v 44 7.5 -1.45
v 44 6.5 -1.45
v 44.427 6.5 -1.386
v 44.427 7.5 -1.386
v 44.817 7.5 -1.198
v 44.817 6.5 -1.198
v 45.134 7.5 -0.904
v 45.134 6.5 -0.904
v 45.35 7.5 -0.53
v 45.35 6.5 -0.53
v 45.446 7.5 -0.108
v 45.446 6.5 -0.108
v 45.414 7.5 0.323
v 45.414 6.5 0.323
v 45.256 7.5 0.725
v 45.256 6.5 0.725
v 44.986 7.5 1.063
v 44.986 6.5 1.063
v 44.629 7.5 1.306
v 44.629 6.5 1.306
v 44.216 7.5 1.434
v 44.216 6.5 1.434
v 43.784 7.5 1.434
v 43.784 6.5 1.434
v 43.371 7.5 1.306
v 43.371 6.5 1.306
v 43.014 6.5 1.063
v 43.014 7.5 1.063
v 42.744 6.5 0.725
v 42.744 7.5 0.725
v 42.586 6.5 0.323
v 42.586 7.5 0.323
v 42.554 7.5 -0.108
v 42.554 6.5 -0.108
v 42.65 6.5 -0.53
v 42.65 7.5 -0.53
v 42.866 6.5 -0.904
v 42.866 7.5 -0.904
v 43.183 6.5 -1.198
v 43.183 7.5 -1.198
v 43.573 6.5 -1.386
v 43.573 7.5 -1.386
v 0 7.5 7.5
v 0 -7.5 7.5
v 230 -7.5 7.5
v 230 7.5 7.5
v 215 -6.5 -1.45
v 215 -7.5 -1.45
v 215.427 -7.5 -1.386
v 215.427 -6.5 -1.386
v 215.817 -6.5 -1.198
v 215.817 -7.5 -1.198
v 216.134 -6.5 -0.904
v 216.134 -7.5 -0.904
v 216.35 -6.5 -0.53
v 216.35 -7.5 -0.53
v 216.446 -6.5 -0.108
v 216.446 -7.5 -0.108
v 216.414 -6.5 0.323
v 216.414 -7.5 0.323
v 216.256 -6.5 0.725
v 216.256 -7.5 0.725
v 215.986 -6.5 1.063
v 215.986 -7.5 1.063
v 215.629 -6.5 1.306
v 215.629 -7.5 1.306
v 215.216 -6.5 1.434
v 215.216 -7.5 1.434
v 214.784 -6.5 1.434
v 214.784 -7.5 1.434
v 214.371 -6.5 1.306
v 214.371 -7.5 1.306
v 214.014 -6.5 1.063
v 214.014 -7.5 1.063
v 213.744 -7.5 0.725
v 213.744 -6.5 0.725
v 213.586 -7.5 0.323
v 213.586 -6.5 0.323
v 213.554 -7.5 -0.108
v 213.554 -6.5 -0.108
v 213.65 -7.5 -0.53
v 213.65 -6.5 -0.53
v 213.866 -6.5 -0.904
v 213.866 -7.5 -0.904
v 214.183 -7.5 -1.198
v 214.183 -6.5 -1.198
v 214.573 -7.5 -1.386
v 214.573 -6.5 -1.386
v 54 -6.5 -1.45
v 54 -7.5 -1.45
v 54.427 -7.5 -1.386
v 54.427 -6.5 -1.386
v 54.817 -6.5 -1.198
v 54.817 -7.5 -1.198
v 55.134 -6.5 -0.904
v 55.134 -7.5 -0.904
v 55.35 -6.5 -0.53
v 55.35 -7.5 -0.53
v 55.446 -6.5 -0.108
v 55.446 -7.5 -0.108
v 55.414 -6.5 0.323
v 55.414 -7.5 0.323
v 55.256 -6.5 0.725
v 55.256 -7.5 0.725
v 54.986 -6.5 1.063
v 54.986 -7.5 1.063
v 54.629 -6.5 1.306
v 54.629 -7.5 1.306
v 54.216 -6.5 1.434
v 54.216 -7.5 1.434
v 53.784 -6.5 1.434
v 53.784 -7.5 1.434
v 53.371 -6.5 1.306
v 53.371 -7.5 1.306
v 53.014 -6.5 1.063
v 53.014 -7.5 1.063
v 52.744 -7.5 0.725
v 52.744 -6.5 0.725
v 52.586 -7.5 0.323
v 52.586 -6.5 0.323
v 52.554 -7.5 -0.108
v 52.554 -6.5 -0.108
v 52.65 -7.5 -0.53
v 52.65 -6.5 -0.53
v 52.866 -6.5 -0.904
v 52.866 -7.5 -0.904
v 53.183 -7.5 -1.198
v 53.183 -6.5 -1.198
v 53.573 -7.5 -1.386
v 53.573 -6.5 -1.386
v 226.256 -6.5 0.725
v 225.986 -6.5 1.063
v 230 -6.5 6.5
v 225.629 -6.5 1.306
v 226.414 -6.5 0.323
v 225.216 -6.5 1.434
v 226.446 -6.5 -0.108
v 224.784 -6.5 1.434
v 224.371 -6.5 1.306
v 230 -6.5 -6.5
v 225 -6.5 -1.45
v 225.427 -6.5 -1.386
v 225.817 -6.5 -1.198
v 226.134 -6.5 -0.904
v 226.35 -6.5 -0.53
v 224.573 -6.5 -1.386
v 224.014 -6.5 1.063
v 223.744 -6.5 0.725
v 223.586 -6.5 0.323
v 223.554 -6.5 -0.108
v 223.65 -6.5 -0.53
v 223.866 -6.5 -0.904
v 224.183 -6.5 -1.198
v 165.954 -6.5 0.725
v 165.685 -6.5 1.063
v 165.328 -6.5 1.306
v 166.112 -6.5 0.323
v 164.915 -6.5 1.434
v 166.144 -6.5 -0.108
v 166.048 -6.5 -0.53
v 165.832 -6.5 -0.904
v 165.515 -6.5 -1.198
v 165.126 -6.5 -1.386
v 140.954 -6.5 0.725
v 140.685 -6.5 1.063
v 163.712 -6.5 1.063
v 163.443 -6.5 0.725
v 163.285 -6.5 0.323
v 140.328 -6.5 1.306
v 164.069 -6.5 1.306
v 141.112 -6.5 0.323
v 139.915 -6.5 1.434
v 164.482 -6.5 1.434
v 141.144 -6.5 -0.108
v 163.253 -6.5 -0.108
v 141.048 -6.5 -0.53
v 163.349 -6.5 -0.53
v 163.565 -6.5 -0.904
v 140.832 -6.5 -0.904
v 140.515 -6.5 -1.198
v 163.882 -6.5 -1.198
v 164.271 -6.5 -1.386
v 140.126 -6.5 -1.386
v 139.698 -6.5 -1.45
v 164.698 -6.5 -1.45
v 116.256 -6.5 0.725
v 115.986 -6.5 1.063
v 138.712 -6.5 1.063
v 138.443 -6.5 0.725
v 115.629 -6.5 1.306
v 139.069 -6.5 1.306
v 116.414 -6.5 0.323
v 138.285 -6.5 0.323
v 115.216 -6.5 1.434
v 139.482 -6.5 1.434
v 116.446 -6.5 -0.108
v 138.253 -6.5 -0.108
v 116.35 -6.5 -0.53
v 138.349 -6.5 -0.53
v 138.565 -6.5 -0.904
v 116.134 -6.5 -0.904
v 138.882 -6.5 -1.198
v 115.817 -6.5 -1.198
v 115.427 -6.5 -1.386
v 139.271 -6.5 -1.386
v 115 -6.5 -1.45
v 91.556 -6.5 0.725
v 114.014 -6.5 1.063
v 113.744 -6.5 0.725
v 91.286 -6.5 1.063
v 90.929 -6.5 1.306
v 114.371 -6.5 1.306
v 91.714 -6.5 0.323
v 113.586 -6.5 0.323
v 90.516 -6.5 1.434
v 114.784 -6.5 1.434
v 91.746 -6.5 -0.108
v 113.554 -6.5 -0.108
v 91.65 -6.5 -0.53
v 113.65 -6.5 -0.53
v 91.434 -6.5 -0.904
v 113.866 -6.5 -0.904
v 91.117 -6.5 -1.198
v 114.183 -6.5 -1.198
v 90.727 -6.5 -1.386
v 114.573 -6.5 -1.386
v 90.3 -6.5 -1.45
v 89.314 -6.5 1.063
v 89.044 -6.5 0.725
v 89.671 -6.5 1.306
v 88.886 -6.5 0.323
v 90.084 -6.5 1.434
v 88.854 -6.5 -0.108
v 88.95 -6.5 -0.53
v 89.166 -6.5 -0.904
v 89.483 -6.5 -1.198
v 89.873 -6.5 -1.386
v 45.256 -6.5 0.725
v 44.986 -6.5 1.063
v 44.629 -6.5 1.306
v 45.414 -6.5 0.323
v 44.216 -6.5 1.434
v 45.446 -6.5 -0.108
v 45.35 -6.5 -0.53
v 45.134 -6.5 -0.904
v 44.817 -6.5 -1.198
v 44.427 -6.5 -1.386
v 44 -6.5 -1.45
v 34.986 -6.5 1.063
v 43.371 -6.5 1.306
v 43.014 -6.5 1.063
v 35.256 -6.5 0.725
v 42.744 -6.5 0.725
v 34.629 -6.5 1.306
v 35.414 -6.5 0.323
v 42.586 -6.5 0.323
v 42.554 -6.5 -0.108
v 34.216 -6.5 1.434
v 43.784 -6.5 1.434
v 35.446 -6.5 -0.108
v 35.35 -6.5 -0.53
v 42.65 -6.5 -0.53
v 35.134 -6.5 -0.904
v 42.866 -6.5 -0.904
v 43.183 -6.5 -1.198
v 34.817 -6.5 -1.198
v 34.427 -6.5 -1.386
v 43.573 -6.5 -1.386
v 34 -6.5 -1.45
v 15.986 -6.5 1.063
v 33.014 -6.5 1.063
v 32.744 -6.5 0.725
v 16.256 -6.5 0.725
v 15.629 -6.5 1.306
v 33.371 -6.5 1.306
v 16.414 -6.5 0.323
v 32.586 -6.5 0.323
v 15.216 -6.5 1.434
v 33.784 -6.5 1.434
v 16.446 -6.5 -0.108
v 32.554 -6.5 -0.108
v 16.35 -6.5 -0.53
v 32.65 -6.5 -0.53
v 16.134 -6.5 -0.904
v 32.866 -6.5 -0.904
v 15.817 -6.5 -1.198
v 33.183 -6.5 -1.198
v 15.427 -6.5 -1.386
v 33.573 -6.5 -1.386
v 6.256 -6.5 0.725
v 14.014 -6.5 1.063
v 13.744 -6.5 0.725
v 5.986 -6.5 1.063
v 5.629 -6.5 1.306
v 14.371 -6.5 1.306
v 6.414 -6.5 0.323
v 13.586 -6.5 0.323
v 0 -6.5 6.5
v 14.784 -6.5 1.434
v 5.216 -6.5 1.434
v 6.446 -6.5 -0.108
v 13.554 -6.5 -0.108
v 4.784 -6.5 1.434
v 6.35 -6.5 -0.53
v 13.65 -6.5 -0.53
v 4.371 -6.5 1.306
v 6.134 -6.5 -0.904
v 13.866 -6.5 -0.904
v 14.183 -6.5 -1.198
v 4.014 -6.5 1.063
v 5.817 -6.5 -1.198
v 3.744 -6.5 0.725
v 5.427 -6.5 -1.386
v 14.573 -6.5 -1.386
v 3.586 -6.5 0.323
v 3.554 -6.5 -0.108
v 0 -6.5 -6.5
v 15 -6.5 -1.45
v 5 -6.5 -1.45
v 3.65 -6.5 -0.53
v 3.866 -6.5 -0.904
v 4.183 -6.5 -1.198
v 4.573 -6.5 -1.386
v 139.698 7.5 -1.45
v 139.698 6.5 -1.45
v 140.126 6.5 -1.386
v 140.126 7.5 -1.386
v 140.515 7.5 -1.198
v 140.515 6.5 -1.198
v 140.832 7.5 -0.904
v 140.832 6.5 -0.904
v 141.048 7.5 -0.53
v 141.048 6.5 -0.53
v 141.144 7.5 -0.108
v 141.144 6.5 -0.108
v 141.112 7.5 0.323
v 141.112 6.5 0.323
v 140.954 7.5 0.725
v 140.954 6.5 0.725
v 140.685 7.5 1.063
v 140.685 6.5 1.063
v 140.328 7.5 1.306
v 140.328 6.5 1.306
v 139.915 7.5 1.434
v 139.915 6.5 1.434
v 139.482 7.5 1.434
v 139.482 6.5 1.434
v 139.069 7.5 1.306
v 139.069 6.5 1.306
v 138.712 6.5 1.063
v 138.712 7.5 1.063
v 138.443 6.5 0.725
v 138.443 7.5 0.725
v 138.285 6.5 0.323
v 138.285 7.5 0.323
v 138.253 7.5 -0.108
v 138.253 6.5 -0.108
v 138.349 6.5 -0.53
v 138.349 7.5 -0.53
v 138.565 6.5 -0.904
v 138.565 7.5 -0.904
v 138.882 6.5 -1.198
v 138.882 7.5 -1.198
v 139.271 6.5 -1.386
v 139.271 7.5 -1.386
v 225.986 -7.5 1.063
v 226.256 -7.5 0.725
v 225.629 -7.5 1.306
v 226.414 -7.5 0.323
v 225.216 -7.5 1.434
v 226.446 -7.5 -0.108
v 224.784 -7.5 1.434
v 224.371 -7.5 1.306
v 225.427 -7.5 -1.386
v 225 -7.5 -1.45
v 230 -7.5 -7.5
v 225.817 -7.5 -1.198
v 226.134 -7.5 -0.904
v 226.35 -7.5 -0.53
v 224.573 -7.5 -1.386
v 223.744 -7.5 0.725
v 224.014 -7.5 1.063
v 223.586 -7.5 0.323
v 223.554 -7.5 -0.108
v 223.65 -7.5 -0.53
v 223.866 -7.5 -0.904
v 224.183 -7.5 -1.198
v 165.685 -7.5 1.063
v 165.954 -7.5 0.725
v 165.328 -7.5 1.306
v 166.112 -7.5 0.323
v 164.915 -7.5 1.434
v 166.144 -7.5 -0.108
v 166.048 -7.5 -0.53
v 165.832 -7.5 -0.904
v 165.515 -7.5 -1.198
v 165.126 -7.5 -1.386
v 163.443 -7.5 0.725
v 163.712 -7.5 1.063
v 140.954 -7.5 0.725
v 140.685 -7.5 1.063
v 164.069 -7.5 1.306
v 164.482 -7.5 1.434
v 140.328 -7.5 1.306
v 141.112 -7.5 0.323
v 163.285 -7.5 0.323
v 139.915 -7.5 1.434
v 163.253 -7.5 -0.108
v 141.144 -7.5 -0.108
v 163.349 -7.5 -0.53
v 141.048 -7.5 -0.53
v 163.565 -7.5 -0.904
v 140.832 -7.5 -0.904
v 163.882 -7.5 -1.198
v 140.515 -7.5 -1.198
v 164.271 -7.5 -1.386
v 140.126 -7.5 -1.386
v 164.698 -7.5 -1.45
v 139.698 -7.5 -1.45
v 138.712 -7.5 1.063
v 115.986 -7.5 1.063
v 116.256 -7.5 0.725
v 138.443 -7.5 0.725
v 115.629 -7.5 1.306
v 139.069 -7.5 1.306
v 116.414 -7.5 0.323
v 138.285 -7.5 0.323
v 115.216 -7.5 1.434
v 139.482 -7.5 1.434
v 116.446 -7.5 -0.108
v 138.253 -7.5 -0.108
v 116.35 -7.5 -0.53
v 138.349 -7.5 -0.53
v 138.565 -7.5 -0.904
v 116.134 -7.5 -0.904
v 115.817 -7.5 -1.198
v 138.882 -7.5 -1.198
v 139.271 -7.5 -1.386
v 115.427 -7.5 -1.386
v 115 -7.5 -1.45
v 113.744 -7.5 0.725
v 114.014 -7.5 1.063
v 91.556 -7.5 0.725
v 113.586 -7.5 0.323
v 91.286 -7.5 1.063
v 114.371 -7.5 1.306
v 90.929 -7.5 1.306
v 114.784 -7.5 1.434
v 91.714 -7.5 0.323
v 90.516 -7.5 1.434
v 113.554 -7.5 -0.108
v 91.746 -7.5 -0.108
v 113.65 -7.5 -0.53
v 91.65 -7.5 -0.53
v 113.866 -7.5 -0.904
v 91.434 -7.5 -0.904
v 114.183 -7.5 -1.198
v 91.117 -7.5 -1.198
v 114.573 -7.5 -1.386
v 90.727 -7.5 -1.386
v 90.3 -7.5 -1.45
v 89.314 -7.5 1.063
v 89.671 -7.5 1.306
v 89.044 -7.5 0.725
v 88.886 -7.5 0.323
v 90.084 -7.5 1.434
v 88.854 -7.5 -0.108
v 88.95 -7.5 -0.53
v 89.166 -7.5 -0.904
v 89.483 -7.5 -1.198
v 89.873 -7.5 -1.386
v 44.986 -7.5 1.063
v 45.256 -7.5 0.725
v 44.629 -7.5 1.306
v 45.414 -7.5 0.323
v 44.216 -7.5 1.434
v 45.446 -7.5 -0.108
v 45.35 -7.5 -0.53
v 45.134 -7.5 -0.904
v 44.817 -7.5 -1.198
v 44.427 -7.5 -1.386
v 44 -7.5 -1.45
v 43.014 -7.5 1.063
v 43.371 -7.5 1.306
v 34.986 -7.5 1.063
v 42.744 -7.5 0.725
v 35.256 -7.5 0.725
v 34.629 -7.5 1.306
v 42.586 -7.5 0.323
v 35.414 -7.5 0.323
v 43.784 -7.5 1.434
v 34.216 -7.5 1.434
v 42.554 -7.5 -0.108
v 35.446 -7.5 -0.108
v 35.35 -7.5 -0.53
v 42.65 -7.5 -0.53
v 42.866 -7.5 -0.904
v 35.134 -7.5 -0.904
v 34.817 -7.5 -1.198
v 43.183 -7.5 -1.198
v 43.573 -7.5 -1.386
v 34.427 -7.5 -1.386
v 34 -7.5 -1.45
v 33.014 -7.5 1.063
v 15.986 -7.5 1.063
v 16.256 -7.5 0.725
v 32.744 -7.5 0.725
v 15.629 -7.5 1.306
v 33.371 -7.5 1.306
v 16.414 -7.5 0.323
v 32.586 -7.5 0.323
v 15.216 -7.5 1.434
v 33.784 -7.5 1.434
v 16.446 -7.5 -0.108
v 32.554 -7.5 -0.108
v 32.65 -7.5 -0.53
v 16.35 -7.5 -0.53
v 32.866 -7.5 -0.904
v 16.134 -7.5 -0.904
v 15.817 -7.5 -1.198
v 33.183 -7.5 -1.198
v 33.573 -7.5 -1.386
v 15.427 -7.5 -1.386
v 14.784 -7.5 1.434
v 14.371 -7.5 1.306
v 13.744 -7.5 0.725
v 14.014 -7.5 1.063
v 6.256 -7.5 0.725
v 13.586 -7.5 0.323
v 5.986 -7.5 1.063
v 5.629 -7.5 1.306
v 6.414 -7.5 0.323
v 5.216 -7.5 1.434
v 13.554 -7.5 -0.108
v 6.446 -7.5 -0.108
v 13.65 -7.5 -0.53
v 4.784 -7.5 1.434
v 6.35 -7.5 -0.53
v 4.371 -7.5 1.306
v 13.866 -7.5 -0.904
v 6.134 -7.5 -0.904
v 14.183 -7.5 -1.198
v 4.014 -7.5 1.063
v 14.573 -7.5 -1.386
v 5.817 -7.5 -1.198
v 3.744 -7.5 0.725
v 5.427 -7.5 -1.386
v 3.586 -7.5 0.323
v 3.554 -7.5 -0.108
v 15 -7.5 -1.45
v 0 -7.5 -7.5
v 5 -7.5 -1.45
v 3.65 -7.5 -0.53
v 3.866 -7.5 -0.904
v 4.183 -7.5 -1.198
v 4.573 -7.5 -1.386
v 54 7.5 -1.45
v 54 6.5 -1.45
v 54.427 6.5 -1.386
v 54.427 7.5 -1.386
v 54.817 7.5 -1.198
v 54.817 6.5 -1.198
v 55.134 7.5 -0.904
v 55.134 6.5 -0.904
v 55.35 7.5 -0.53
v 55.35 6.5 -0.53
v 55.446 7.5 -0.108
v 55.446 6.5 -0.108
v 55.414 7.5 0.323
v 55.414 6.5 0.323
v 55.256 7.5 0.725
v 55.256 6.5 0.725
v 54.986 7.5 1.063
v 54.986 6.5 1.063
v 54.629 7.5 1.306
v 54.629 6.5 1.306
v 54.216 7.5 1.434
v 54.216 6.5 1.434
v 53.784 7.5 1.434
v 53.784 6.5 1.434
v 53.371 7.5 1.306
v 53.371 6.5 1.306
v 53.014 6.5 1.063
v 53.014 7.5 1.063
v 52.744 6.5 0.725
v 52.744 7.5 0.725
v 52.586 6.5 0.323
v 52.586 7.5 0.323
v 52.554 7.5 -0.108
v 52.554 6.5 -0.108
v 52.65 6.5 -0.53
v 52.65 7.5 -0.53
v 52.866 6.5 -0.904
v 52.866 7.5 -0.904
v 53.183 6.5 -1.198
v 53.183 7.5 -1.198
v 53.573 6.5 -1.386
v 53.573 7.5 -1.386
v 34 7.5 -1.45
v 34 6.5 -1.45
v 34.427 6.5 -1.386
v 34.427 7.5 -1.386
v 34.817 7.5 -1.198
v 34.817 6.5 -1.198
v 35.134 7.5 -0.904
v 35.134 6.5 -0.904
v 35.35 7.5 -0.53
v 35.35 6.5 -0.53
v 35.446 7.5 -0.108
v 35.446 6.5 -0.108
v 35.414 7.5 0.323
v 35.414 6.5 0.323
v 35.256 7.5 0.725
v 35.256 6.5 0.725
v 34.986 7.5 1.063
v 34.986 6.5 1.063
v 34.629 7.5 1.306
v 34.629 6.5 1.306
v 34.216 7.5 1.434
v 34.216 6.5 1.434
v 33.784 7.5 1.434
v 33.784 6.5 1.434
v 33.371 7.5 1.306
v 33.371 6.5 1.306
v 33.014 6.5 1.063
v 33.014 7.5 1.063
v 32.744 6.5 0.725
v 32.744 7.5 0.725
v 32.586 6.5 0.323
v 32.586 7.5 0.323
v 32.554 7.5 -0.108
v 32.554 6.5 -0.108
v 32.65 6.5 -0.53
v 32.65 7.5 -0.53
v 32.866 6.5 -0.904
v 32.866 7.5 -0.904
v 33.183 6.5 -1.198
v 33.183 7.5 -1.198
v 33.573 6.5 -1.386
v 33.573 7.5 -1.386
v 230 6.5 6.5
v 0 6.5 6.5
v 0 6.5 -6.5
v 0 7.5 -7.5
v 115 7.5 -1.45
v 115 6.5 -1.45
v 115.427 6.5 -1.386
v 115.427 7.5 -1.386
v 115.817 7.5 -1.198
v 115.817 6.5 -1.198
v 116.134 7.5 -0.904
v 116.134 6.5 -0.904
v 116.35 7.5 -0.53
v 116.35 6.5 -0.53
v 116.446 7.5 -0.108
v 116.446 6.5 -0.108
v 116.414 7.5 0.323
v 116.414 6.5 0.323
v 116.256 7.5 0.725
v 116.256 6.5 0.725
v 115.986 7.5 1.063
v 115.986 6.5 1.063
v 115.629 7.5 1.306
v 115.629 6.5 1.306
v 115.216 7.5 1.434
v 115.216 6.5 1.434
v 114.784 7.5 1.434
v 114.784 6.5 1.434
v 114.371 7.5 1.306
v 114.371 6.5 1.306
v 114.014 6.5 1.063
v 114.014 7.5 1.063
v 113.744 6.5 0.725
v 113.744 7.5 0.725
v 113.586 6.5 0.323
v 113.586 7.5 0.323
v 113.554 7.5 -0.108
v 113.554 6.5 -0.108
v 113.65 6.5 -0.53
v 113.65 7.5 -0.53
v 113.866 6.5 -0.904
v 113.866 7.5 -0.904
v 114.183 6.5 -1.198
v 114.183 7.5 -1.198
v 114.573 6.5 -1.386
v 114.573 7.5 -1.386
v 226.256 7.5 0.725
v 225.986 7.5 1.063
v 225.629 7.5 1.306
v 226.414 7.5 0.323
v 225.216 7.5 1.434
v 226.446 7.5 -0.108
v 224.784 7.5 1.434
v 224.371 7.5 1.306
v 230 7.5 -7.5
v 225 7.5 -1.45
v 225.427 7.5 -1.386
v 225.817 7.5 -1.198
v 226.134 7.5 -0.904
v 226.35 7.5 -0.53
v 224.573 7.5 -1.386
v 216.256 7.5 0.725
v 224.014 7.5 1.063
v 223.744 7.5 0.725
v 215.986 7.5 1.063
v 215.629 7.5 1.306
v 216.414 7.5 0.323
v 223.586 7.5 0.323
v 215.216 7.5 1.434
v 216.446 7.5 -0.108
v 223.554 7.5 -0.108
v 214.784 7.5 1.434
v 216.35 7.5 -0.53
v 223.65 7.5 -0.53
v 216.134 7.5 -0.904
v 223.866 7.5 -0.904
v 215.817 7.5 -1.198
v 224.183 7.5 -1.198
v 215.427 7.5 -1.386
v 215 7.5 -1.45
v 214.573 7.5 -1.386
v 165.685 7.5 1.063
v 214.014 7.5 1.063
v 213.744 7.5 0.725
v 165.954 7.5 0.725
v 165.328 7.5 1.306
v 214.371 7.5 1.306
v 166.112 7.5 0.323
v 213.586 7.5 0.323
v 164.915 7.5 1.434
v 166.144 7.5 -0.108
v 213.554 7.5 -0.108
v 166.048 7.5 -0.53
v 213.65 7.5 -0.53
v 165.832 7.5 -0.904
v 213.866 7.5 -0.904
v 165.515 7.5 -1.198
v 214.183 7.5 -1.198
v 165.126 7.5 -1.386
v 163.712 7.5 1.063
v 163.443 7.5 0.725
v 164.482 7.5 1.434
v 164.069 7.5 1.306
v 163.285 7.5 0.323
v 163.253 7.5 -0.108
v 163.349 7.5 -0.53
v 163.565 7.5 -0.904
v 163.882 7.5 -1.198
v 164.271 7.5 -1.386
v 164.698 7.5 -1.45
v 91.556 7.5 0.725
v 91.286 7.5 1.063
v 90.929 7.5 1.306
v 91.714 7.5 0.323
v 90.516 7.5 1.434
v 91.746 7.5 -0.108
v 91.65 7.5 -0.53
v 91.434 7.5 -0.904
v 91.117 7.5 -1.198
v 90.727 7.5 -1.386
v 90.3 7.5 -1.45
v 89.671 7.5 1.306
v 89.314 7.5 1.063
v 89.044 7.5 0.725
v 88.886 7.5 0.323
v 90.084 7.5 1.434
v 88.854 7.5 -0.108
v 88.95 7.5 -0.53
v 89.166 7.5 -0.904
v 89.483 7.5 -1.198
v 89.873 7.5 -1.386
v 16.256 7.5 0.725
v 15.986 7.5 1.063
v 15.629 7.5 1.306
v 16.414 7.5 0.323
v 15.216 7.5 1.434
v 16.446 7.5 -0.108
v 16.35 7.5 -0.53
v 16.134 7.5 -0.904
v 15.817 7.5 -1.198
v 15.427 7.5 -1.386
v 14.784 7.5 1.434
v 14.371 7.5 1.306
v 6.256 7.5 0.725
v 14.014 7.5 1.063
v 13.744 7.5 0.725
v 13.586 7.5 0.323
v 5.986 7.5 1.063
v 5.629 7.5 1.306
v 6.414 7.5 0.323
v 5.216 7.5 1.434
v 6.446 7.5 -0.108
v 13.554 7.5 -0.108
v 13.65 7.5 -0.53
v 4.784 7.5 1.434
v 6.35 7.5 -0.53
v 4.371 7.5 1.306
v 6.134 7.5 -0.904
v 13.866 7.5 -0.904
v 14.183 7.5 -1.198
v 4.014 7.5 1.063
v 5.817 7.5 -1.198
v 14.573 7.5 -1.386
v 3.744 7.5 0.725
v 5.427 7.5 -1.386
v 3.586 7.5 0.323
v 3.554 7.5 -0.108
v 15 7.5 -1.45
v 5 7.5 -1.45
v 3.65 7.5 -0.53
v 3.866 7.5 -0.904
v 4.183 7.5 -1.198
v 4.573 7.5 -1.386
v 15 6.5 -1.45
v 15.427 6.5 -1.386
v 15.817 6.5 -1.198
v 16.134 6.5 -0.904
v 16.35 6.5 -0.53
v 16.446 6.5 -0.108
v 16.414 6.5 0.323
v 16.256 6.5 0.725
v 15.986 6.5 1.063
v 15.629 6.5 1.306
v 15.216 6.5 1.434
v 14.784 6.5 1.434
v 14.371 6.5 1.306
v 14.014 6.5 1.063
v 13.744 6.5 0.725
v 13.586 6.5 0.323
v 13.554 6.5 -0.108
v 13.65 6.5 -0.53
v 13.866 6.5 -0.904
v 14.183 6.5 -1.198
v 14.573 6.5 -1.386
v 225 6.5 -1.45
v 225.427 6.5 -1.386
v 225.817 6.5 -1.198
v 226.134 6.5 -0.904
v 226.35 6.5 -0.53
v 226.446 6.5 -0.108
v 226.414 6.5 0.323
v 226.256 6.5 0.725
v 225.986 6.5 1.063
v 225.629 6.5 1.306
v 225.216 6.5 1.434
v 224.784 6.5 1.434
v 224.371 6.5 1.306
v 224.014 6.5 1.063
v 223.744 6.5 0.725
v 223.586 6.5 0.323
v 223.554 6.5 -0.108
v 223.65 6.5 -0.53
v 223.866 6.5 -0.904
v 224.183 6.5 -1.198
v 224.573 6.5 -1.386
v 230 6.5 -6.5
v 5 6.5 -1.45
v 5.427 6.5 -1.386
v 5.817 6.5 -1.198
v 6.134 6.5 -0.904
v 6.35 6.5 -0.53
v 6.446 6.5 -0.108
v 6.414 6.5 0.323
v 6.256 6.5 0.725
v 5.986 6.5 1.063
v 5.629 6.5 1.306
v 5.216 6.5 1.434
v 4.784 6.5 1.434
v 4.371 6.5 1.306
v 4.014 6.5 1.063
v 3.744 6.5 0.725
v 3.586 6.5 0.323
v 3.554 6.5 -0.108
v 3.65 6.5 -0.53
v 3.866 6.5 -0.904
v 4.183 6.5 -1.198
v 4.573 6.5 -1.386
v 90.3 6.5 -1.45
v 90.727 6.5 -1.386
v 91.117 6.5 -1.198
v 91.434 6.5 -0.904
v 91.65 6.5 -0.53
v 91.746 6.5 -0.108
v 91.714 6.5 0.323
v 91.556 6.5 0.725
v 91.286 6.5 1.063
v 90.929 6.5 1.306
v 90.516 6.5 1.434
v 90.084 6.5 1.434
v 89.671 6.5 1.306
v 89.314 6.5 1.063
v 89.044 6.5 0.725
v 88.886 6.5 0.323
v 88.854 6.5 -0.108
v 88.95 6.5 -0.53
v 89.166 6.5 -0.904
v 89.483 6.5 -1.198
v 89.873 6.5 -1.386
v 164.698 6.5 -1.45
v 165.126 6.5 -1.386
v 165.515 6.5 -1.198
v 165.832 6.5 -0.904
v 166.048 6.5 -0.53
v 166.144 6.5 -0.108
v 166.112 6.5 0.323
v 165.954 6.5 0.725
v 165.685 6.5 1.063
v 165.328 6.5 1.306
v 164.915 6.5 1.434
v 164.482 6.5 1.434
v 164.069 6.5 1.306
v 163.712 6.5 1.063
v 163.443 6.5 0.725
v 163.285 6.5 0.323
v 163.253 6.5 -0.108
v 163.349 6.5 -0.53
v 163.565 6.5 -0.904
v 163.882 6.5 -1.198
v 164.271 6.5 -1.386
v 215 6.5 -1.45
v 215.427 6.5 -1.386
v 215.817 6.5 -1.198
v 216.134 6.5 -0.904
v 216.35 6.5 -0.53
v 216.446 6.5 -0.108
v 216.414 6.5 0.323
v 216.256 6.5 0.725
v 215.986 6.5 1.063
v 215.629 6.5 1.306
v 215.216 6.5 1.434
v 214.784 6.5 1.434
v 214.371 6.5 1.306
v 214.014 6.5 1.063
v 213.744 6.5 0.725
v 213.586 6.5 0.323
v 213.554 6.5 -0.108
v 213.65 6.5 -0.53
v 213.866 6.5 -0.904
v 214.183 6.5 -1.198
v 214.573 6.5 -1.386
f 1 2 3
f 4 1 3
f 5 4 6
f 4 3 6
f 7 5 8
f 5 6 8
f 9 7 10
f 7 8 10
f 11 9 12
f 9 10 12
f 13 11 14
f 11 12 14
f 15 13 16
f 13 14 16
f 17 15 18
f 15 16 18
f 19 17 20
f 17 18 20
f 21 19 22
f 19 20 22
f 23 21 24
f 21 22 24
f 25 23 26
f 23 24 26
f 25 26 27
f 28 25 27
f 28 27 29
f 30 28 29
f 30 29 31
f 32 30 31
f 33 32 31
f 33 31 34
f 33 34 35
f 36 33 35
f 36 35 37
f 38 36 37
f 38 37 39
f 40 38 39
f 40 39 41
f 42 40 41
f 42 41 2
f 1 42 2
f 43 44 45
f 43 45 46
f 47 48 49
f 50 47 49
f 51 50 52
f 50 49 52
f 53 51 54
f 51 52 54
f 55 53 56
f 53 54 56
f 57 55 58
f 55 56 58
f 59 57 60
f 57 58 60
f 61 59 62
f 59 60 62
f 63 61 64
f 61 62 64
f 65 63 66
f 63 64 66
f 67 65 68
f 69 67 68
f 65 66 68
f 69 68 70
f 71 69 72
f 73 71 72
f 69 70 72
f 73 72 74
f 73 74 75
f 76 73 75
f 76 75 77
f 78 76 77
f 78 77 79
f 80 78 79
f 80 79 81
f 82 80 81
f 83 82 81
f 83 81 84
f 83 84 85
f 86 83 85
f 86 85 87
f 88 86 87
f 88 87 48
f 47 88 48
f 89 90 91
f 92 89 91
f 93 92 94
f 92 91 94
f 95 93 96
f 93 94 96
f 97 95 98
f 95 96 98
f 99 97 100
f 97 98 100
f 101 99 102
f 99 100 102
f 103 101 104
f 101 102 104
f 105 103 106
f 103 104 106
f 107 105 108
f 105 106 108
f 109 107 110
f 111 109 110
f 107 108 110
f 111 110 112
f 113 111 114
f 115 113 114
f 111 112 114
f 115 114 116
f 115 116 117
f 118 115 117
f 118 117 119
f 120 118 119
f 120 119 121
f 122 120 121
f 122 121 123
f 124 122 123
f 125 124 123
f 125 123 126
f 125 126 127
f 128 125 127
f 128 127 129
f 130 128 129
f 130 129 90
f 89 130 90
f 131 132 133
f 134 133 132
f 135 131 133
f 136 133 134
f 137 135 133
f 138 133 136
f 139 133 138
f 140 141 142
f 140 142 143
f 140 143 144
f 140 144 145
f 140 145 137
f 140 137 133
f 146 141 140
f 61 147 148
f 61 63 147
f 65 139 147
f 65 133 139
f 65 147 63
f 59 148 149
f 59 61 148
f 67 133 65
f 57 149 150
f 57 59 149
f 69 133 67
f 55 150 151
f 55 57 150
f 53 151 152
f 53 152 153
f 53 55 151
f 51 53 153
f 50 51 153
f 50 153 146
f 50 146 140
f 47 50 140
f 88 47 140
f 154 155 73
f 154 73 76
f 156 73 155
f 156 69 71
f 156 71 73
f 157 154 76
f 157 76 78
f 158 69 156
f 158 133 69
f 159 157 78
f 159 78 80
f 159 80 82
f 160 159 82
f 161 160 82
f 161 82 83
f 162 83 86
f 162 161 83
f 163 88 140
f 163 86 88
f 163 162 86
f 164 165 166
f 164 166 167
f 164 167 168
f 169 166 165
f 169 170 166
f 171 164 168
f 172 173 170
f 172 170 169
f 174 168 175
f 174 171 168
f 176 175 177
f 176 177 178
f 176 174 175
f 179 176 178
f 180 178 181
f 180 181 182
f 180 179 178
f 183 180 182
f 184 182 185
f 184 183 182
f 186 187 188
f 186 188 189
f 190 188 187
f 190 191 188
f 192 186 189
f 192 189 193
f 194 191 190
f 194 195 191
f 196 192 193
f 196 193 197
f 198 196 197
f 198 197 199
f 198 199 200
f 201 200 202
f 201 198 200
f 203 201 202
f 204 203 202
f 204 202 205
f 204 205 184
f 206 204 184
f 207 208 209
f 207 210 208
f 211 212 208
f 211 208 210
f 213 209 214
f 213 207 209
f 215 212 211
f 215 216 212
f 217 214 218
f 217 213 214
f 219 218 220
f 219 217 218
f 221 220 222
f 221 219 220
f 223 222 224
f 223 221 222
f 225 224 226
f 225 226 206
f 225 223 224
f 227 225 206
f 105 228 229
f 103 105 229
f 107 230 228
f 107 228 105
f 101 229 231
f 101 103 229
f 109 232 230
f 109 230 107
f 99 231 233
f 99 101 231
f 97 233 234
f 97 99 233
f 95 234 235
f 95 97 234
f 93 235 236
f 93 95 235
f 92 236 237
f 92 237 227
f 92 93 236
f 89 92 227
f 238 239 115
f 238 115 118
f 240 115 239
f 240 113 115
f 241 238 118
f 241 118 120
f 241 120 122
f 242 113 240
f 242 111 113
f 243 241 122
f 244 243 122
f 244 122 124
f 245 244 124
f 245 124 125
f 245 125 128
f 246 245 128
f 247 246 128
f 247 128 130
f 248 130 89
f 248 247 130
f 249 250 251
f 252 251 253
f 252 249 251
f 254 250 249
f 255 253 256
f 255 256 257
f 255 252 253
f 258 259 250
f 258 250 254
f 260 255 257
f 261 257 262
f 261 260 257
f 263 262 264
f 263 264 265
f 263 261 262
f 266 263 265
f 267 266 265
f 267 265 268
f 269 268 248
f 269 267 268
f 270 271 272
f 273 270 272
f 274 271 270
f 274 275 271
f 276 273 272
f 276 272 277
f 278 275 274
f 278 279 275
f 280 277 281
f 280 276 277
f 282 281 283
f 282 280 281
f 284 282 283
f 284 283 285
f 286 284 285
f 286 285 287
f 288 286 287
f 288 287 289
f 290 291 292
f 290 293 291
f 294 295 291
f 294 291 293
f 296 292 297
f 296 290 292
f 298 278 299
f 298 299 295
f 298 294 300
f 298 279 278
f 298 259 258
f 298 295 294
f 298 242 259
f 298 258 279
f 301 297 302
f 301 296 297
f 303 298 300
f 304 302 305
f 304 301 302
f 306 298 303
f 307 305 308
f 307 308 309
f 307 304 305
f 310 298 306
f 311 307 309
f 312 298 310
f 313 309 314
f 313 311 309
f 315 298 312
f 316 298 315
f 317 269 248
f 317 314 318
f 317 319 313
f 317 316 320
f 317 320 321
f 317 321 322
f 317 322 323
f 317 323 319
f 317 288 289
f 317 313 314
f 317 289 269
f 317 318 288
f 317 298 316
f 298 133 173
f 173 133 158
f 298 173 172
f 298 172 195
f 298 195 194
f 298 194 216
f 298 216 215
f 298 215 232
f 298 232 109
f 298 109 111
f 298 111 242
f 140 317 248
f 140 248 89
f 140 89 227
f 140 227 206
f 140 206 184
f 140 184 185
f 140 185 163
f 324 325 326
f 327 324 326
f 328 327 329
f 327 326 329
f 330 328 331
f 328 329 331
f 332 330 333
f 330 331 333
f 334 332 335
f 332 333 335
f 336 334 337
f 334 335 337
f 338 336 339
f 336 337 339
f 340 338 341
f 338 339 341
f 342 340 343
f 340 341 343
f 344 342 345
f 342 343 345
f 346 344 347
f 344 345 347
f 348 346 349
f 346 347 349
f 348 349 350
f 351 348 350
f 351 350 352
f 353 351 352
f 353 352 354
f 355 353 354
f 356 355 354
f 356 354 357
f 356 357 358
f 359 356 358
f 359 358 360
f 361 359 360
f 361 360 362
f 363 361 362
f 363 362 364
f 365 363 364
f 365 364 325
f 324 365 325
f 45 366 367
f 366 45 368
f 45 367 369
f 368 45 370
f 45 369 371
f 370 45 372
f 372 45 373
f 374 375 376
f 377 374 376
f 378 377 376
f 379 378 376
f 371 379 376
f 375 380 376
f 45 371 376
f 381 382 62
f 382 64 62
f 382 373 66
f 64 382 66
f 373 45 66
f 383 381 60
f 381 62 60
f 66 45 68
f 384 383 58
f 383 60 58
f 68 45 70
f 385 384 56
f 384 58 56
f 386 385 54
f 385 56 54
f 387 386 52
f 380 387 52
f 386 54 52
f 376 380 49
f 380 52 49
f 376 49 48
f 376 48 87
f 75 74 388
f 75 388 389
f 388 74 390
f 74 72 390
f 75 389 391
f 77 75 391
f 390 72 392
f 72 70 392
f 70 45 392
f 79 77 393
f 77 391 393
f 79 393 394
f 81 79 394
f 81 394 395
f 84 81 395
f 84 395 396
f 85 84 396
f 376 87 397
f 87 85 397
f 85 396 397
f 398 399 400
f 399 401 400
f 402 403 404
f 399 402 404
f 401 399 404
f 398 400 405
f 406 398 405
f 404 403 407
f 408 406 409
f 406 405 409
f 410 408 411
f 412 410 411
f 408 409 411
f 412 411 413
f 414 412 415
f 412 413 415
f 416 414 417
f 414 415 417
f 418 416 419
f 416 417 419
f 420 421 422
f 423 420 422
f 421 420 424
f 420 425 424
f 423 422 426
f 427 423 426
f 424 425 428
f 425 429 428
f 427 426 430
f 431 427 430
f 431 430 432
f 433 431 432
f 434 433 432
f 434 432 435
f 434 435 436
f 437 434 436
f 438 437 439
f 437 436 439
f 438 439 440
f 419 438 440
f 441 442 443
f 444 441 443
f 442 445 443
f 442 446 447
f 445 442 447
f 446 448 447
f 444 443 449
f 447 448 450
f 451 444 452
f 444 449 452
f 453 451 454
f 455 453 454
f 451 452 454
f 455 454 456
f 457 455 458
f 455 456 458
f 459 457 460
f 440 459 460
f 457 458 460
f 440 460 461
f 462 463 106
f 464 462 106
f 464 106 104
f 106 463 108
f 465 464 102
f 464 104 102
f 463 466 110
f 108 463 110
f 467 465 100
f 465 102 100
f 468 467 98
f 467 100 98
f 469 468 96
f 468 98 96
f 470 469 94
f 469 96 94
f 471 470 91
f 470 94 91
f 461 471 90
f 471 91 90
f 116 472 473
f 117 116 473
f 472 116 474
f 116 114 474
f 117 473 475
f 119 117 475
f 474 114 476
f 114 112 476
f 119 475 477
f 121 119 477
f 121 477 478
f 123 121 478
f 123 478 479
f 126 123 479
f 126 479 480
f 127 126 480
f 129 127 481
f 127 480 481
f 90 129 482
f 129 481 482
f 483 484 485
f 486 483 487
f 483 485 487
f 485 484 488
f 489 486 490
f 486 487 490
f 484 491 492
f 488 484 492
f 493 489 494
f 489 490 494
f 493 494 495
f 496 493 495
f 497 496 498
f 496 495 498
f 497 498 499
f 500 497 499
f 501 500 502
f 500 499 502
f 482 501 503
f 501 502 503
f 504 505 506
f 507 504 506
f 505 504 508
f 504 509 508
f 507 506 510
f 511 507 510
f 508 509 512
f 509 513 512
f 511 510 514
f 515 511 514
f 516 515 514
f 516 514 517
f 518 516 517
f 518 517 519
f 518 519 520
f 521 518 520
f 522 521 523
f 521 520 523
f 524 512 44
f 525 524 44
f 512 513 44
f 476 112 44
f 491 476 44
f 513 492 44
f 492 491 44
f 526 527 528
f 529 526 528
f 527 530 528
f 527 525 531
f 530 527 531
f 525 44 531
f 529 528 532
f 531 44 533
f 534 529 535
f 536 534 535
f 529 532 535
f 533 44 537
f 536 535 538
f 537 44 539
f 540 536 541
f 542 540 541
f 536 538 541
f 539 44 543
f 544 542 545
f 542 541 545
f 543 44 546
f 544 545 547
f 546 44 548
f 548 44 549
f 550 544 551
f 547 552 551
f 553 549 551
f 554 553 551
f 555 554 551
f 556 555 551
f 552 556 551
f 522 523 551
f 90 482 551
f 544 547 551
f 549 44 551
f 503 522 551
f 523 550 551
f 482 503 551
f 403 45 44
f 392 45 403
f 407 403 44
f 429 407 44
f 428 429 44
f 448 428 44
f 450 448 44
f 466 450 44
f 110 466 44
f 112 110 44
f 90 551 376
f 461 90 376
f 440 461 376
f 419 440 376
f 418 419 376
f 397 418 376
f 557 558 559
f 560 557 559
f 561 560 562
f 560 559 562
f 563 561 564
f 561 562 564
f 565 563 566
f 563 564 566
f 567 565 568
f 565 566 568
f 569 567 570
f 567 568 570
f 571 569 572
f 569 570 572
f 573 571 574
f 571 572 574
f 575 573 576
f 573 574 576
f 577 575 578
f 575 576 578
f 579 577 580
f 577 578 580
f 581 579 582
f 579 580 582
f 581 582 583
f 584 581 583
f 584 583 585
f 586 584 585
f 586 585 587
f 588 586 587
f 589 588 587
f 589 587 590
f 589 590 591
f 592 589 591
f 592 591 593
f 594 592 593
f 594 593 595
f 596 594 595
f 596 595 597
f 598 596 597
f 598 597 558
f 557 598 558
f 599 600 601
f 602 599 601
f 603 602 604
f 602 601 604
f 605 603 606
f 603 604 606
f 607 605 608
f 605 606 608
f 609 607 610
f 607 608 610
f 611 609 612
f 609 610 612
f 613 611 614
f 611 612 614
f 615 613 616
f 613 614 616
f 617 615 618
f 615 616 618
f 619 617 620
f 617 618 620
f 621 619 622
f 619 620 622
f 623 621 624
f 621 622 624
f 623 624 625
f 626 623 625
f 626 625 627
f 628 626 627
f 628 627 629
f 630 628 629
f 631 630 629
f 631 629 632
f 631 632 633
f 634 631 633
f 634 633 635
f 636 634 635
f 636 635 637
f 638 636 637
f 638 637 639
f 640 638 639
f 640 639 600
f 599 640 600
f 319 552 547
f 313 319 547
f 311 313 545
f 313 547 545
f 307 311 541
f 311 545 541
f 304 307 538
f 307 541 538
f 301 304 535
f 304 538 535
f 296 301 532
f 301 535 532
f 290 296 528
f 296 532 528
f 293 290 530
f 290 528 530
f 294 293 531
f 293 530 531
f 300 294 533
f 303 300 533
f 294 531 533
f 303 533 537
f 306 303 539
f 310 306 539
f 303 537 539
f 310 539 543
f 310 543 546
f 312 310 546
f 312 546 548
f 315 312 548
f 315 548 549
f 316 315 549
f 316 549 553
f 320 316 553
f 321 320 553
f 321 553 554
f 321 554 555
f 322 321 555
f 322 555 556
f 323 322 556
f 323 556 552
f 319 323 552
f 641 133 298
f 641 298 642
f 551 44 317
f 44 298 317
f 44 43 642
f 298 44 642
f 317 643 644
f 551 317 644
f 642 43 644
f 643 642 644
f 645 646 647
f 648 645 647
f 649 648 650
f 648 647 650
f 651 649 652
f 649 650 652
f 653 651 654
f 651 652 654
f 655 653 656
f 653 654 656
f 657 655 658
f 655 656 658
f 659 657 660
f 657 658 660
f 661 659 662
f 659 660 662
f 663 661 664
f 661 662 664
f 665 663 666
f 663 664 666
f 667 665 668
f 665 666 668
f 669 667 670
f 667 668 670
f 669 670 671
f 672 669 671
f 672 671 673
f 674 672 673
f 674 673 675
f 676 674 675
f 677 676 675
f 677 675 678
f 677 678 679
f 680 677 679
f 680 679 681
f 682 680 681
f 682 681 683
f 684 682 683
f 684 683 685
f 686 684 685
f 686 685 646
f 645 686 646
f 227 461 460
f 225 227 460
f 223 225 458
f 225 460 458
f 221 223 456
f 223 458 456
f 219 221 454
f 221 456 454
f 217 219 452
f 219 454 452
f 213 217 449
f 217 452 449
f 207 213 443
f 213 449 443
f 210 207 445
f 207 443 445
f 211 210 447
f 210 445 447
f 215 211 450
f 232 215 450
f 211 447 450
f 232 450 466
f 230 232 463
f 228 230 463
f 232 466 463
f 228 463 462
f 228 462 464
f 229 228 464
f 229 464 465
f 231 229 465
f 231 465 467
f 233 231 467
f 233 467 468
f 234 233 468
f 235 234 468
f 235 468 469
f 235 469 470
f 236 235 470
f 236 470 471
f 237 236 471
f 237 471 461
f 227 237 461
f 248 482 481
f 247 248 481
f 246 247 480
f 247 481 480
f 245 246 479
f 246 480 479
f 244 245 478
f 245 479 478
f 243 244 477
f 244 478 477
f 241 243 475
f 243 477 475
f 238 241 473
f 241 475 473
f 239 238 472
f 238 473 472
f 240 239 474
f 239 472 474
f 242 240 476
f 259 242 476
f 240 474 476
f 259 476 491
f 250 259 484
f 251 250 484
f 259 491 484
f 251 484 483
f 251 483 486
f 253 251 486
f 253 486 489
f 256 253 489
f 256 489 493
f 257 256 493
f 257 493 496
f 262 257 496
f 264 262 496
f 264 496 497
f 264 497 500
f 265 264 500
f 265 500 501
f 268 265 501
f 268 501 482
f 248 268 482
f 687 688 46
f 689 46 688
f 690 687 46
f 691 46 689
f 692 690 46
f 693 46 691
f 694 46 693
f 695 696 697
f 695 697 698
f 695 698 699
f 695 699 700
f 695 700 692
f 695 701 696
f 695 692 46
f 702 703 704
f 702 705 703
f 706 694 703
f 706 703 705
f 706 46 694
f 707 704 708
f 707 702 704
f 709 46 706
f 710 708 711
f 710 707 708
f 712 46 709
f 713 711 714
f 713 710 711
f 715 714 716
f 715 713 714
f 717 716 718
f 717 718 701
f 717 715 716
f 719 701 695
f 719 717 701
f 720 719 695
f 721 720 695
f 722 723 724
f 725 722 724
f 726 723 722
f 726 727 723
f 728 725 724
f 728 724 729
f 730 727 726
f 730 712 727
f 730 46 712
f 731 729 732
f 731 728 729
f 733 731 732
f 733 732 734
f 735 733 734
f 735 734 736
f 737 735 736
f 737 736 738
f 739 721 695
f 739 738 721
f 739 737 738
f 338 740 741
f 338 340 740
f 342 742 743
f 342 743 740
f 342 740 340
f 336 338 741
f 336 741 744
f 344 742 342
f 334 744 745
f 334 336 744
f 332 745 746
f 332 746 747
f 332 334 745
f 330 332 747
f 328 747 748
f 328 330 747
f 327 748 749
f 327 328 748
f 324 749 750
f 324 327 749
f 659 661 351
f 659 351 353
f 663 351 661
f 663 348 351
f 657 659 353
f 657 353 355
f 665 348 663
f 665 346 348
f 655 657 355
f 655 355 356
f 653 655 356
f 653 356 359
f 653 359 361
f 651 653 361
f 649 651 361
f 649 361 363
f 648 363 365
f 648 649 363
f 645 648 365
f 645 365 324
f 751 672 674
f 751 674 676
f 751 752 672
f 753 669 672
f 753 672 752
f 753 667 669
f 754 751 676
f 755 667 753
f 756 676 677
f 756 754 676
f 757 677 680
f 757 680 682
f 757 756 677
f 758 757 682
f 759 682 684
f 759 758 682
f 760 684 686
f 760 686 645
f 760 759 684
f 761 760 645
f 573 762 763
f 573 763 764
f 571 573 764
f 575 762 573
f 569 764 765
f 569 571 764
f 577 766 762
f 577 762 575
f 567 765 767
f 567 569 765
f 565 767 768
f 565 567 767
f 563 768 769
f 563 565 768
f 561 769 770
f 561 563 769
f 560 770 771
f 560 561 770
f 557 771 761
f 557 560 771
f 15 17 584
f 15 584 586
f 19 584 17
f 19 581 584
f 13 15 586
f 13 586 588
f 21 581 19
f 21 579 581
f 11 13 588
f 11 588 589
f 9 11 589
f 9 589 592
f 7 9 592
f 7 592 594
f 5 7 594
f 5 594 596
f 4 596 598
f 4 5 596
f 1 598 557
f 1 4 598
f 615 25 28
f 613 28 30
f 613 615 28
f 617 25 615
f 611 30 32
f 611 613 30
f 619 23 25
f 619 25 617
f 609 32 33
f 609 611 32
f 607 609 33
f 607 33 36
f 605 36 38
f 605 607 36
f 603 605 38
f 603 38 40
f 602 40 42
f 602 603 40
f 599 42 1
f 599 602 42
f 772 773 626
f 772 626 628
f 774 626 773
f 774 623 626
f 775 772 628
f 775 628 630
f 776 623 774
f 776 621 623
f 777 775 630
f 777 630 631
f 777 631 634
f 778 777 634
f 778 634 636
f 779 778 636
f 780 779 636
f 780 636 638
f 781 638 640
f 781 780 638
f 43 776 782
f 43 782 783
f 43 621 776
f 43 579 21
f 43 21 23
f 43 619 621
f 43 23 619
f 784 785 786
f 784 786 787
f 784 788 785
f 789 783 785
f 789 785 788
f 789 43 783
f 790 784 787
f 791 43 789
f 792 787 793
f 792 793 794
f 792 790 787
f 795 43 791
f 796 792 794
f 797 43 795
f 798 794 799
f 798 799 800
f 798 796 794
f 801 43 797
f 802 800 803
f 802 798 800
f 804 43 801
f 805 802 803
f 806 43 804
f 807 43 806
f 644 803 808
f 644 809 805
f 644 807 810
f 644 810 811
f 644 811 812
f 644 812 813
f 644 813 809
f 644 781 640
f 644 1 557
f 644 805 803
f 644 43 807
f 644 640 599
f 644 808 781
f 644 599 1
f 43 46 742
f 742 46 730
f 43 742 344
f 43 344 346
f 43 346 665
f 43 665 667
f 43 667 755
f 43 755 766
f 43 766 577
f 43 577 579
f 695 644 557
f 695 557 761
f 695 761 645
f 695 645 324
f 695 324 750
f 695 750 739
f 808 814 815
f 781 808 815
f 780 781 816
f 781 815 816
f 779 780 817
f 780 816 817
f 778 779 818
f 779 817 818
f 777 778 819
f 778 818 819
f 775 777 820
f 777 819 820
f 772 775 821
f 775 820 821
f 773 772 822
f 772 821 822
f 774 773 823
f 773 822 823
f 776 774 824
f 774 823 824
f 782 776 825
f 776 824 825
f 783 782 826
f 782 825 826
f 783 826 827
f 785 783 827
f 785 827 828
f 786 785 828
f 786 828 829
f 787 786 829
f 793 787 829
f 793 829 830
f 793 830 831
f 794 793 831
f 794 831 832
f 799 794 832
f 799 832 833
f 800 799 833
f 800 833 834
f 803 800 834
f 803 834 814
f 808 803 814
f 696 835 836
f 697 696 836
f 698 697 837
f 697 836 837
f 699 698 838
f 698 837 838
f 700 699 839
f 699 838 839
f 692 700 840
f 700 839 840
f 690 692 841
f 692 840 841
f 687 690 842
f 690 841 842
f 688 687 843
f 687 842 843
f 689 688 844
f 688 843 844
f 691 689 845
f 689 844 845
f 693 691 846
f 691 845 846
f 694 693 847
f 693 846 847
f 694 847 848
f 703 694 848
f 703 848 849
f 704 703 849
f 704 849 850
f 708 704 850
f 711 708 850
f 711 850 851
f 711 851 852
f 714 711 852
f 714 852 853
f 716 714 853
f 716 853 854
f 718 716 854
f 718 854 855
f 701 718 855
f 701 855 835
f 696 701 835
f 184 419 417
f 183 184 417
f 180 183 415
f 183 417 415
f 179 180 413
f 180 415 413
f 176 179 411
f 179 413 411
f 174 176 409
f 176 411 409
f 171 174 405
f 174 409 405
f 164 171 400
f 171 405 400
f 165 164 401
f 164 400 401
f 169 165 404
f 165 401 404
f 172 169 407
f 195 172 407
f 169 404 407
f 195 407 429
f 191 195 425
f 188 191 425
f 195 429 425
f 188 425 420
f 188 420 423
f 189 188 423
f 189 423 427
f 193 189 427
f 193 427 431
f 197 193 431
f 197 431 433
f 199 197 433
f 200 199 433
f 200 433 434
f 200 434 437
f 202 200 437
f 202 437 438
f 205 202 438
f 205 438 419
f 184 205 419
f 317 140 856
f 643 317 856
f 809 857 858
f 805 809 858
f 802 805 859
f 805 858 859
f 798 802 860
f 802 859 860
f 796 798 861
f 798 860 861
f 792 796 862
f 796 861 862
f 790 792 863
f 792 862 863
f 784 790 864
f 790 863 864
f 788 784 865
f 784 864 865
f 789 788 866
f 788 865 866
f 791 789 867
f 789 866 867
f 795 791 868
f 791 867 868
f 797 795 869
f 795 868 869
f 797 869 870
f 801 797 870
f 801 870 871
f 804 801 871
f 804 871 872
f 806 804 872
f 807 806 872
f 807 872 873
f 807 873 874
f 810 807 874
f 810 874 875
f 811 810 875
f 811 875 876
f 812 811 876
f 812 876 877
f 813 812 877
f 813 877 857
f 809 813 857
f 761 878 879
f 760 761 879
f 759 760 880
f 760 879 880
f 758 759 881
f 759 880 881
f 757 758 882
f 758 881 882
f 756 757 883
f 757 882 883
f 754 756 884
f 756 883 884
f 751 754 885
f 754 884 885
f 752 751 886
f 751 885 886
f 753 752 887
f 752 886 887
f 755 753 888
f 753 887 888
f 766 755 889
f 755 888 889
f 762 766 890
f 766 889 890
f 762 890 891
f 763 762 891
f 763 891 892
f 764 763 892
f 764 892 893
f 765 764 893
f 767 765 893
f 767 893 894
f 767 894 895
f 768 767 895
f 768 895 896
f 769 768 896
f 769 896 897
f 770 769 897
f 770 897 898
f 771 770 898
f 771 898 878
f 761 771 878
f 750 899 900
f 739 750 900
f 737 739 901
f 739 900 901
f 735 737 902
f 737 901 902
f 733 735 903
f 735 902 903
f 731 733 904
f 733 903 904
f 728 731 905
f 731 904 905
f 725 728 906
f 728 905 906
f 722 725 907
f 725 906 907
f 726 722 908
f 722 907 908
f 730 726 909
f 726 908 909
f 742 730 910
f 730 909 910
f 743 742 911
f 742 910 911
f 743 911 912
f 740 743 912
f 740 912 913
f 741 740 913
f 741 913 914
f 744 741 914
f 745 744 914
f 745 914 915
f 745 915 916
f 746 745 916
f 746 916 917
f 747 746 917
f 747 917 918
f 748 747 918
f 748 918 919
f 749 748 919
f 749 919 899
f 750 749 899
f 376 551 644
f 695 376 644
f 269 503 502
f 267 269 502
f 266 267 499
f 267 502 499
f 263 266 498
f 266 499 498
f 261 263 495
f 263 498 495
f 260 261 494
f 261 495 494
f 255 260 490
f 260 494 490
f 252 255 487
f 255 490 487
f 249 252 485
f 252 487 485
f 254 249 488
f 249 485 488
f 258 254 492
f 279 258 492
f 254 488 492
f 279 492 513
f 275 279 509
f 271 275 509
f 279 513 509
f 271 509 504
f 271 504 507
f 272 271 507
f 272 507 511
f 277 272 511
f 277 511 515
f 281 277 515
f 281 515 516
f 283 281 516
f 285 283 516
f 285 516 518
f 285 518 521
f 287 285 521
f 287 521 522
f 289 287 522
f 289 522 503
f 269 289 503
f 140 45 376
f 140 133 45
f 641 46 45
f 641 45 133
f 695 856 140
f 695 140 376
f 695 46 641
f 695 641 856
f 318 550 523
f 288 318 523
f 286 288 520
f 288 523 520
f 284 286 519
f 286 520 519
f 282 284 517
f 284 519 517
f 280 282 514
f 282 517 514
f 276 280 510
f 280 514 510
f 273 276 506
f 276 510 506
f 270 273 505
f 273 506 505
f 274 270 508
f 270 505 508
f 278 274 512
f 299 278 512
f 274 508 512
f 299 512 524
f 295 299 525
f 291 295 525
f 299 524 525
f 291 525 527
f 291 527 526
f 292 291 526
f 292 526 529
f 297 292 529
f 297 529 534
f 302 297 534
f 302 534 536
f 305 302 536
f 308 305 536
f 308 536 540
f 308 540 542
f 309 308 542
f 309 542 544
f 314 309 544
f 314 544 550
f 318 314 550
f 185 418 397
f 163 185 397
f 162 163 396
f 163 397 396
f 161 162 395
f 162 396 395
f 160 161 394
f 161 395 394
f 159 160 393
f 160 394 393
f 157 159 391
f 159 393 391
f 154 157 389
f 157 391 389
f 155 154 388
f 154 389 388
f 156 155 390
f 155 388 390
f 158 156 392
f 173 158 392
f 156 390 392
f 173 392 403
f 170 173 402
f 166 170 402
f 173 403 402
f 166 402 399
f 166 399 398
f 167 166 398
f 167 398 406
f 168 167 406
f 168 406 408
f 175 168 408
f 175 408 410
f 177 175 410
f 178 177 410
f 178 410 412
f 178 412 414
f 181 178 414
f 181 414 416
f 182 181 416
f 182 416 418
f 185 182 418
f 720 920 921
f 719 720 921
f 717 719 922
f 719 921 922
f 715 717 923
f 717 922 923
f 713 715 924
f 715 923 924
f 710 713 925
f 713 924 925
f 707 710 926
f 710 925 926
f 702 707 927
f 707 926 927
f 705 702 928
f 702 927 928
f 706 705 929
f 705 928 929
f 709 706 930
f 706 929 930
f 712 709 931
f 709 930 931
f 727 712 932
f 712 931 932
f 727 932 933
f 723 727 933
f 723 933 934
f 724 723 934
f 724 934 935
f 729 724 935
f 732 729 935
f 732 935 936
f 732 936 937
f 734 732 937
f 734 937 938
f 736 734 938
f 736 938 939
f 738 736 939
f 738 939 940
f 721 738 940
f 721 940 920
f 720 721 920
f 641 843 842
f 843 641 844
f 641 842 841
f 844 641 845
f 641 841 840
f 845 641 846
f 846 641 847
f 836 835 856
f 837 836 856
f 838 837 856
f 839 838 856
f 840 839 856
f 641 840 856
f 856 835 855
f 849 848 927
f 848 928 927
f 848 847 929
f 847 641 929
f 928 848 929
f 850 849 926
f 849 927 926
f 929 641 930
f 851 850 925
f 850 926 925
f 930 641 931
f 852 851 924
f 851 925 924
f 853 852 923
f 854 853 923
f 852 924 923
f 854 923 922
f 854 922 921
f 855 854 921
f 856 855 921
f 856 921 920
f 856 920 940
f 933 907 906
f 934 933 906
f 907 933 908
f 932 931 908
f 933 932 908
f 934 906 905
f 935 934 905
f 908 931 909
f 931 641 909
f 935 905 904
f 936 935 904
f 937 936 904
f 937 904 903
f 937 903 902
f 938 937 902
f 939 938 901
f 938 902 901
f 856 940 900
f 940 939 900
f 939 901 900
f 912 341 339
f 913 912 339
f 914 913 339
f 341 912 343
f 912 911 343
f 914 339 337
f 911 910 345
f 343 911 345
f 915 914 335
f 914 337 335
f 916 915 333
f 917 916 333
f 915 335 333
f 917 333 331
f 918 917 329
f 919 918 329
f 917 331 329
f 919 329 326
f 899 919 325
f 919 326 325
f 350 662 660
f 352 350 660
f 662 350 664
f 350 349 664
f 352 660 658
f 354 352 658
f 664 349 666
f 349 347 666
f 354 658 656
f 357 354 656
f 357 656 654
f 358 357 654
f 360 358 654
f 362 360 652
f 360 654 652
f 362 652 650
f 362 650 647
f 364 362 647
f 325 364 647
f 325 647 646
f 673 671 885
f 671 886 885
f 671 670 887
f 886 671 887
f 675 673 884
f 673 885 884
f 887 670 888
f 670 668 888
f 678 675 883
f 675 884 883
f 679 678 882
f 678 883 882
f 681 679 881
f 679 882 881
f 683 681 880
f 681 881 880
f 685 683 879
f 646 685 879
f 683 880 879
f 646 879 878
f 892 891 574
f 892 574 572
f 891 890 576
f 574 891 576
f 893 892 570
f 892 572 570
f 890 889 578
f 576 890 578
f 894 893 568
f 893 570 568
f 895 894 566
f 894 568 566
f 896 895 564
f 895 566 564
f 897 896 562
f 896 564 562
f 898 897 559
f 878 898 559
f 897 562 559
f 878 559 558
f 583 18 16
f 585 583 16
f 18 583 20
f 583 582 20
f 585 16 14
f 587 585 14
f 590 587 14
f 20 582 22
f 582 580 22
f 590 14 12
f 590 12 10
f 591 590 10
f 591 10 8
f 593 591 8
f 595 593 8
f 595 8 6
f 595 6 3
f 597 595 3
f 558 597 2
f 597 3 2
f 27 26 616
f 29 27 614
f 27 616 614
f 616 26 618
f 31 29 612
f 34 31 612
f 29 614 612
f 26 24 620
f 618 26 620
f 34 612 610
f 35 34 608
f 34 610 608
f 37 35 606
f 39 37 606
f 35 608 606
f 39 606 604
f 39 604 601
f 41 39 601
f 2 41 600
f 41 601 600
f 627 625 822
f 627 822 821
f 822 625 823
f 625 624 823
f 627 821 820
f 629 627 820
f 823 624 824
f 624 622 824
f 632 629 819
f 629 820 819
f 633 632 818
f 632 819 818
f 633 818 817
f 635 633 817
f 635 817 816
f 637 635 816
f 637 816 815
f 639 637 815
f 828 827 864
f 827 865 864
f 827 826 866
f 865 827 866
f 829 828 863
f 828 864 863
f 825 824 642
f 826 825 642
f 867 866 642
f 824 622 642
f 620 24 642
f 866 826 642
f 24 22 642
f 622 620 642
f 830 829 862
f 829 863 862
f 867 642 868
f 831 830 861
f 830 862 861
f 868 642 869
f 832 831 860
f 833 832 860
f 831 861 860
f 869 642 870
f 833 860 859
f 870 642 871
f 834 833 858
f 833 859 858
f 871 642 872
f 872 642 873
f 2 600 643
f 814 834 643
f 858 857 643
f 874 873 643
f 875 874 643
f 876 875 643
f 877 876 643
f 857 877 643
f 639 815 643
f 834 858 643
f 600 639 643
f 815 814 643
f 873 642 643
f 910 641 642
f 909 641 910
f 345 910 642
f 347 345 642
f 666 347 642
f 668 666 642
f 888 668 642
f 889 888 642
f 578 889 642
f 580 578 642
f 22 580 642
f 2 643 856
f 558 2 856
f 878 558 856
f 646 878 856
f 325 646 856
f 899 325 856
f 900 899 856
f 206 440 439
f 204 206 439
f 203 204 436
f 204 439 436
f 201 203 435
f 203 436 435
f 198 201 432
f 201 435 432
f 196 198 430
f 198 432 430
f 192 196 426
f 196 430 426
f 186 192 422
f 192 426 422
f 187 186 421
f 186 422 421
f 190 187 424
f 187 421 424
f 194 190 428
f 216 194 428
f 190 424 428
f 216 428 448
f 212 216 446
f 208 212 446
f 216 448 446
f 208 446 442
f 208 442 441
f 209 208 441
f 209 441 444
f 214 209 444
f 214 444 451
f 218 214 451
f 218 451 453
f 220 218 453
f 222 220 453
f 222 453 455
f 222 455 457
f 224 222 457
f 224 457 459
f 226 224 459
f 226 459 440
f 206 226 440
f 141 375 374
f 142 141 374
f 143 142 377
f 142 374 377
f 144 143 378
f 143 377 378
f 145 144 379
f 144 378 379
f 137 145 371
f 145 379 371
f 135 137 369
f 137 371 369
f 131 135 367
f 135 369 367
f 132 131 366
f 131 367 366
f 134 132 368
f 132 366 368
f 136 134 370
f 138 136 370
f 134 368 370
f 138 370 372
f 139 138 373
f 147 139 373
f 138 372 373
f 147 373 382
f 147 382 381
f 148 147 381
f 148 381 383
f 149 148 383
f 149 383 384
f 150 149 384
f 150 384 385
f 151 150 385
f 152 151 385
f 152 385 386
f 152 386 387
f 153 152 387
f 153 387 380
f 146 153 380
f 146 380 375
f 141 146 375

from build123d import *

# Parameters (mm, degrees)
SKETCH_1_W          = 15
SKETCH_1_H          = 15
SKETCH_1_W_2        = 13
SKETCH_1_H_2        = 13
EXTRUDE_1_DEPTH     = 230
SKETCH_2_R          = 1.45
CUT_EXTRUDE_1_DEPTH = 231.610602532


with BuildPart() as part:
    # 草图1 → 凸台-拉伸1 (new body)
    with BuildSketch(Plane(origin=(0, 0, 0), x_dir=(0, 0, -1), z_dir=(1, 0, 0))):
        Rectangle(SKETCH_1_W, SKETCH_1_H)
        Rectangle(SKETCH_1_W_2, SKETCH_1_H_2, mode=Mode.SUBTRACT)
    extrude(amount=EXTRUDE_1_DEPTH)

    # 草图2 → 切除-拉伸1 (cut, through all)
    with BuildSketch(Plane.XZ.offset(7.5)):
        with Locations(Location((215, 0, 0), (0, 0, 270))):
            Circle(SKETCH_2_R)
        with Locations(Location((225, 0, 0), (0, 0, 270))):
            Circle(SKETCH_2_R)
        with Locations(Location((164.69848481, 0, 0), (0, 0, 270))):
            Circle(SKETCH_2_R)
        with Locations(Location((139.69848481, 0, 0), (0, 0, 270))):
            Circle(SKETCH_2_R)
        with Locations(Location((5, 0, 0), (0, 0, 270))):
            Circle(SKETCH_2_R)
        with Locations(Location((15, 0, 0), (0, 0, 270))):
            Circle(SKETCH_2_R)
        with Locations(Location((115, 0, 0), (0, 0, 270))):
            Circle(SKETCH_2_R)
        with Locations(Location((90.3, 0, 0), (0, 0, 270))):
            Circle(SKETCH_2_R)
        with Locations(Location((34, 0, 0), (0, 0, 270))):
            Circle(SKETCH_2_R)
        with Locations(Location((44, 0, 0), (0, 0, 270))):
            Circle(SKETCH_2_R)
        with Locations(Location((54, 0, 0), (0, 0, 270))):
            Circle(SKETCH_2_R)
    extrude(amount=-CUT_EXTRUDE_1_DEPTH, mode=Mode.SUBTRACT)


solid = part.part
